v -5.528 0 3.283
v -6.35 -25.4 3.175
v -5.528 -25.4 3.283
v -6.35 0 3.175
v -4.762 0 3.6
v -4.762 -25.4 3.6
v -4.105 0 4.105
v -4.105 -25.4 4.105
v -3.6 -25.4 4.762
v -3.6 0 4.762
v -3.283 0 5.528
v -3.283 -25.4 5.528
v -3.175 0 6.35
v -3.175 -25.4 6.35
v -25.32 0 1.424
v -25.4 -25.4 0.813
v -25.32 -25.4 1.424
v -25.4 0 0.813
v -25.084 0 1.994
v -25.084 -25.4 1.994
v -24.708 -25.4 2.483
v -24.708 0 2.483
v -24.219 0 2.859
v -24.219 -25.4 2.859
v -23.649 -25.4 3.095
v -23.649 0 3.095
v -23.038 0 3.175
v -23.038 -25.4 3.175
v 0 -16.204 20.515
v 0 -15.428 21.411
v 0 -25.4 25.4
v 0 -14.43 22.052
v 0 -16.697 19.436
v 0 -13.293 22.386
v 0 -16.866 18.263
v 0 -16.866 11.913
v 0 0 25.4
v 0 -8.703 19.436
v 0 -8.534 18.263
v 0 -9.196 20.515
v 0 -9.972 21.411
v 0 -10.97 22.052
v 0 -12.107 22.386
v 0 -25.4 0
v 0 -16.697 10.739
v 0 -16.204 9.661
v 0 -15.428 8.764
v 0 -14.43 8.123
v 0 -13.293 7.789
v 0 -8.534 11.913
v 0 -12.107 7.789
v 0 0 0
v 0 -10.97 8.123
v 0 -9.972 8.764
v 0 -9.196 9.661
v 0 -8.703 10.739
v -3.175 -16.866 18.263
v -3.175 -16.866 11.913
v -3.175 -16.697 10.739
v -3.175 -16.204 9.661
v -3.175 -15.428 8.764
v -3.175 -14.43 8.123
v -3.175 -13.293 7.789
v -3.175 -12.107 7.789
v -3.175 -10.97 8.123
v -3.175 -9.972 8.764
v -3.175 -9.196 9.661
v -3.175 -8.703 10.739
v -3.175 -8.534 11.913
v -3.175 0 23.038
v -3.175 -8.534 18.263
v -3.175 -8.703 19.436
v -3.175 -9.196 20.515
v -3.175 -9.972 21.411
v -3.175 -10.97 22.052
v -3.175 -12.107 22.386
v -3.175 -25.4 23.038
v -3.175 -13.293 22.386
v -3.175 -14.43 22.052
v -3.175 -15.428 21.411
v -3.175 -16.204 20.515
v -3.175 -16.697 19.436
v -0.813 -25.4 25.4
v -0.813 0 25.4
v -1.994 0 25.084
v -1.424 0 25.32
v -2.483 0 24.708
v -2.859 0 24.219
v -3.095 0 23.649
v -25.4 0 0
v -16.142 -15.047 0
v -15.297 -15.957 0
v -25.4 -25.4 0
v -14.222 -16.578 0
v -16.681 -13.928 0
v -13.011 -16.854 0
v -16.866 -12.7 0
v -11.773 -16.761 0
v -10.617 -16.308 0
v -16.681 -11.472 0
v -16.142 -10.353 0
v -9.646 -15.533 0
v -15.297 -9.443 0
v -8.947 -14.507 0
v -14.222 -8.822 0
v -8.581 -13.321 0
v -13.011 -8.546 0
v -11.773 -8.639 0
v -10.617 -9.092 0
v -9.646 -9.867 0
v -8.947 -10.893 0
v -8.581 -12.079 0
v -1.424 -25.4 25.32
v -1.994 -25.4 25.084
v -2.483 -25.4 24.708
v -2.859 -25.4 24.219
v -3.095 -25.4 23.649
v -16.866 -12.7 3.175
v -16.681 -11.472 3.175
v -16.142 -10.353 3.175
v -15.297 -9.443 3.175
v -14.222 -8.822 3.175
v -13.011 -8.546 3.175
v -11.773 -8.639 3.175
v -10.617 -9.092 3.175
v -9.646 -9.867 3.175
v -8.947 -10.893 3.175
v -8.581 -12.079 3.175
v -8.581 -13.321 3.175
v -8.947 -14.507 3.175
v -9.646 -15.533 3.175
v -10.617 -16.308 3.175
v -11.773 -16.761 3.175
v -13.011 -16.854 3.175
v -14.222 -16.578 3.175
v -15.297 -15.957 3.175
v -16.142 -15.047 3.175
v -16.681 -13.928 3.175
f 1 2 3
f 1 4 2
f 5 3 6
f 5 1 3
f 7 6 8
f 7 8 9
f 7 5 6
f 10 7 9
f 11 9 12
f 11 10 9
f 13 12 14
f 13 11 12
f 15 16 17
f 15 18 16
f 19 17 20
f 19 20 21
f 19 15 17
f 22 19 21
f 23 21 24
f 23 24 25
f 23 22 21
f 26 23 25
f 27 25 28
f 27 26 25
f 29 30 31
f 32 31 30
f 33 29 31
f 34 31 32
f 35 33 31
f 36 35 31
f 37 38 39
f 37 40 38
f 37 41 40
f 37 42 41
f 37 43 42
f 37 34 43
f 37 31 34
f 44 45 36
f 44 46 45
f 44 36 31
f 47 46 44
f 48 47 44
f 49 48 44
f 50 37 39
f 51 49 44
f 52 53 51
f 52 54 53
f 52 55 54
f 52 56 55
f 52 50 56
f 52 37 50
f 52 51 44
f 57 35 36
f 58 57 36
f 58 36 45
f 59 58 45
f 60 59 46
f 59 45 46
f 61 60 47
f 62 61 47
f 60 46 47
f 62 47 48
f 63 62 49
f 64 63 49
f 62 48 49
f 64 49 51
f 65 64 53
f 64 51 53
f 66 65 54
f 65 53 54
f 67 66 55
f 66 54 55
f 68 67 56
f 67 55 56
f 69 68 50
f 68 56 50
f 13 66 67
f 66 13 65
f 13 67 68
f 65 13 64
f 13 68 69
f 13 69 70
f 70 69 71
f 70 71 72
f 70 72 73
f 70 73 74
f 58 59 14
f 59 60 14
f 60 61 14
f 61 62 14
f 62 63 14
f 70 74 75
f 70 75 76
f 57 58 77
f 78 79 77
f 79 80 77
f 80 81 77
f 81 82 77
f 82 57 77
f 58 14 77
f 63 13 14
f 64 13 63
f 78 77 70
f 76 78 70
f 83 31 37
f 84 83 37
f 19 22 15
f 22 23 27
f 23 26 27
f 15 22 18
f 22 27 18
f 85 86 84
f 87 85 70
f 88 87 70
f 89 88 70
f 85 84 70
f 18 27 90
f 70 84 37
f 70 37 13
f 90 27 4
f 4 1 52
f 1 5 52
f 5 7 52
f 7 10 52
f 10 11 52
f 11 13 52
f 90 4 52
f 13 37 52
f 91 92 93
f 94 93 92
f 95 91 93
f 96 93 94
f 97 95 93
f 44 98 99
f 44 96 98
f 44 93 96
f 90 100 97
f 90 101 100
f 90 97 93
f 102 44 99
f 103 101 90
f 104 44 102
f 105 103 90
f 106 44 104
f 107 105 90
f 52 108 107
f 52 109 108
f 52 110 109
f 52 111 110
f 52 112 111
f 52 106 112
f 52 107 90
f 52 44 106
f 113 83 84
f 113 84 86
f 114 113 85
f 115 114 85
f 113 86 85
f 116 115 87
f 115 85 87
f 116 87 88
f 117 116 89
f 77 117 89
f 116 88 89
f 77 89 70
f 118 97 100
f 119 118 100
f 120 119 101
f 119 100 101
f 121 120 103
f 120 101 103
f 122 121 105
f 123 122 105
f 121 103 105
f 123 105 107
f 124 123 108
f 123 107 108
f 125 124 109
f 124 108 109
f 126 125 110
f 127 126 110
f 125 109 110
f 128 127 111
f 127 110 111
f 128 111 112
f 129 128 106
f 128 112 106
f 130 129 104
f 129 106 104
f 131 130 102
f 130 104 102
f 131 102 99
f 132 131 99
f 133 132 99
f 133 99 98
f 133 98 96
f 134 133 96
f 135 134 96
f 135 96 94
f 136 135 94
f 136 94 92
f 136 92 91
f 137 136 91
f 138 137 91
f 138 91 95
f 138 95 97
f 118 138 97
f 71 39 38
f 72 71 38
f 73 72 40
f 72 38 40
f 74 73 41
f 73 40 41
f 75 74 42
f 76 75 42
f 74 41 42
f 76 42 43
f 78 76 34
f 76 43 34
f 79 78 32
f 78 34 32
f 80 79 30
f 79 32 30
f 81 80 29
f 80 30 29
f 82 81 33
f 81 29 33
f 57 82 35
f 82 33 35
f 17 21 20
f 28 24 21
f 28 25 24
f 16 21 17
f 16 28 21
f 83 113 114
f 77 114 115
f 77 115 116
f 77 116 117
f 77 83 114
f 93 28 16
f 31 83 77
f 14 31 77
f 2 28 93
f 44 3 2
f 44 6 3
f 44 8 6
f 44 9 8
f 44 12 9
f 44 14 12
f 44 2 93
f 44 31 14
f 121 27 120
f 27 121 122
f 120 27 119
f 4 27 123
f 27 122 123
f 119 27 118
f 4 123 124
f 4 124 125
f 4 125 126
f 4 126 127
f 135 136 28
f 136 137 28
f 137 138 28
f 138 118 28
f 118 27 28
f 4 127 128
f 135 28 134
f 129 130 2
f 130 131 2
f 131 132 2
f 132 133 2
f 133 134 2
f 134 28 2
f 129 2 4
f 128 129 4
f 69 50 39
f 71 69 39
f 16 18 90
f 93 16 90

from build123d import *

# Parameters (mm, degrees)
SKETCH1_W           = 25.4
SKETCH1_H           = 25.4
BOSS_EXTRUDE1_DEPTH = 25.4
SKETCH2_W           = 22.225
SKETCH2_H           = 22.225
CUT_EXTRUDE1_DEPTH  = 44.994090512
CUT_EXTRUDE2_DEPTH  = 44.994090512
HOLE1_D             = 8.3312
FILLET1_R           = 2.3622
FILLET2_R           = 3.175


with BuildPart() as part:
    # Sketch1 → Boss-Extrude1 (new body)
    with BuildSketch(Plane(origin=(0, 0, 0), x_dir=(0, 0, -1), z_dir=(1, 0, 0))):
        with Locations((-12.7, -12.7)):
            Rectangle(SKETCH1_W, SKETCH1_H)
    extrude(amount=-BOSS_EXTRUDE1_DEPTH)

    # Sketch2 → Cut-Extrude1 (cut, through all)
    with BuildSketch(Plane.XZ.offset(25.4)):
        with Locations((-14.2875, 14.2875)):
            Rectangle(SKETCH2_W, SKETCH2_H)
    extrude(amount=-CUT_EXTRUDE1_DEPTH, mode=Mode.SUBTRACT)

    # Sketch3 → Cut-Extrude2 (cut, through all)
    with BuildSketch(Plane(origin=(0, 0, 0), x_dir=(0, 0, -1), z_dir=(1, 0, 0))):
        with BuildLine():
            Line((-18.2626, -16.8656), (-11.9126, -16.8656))
            ThreePointArc((-11.9126, -16.8656), (-7.747, -12.7), (-11.9126, -8.5344))
            Line((-11.9126, -8.5344), (-18.2626, -8.5344))
            ThreePointArc((-18.2626, -8.5344), (-22.4282, -12.7), (-18.2626, -16.8656))
        make_face()
    extrude(amount=-CUT_EXTRUDE2_DEPTH, mode=Mode.SUBTRACT)

    # Hole1 (through all)
    with Locations(Plane.XY.offset(3.175)):
        with Locations((-12.7, -12.7)):
            Hole(HOLE1_D / 2)

    # Fillet1
    fillet1_edges = [part.edges().sort_by_distance(p)[0] for p in [
        (-25.4, -12.7, 3.175),
        (-3.175, -12.7, 25.4),
    ]]
    fillet(fillet1_edges, radius=FILLET1_R)

    # Fillet2
    fillet2_edges = [part.edges().sort_by_distance(p)[0] for p in [
        (-3.175, -12.7, 3.175),
    ]]
    fillet(fillet2_edges, radius=FILLET2_R)


solid = part.part
